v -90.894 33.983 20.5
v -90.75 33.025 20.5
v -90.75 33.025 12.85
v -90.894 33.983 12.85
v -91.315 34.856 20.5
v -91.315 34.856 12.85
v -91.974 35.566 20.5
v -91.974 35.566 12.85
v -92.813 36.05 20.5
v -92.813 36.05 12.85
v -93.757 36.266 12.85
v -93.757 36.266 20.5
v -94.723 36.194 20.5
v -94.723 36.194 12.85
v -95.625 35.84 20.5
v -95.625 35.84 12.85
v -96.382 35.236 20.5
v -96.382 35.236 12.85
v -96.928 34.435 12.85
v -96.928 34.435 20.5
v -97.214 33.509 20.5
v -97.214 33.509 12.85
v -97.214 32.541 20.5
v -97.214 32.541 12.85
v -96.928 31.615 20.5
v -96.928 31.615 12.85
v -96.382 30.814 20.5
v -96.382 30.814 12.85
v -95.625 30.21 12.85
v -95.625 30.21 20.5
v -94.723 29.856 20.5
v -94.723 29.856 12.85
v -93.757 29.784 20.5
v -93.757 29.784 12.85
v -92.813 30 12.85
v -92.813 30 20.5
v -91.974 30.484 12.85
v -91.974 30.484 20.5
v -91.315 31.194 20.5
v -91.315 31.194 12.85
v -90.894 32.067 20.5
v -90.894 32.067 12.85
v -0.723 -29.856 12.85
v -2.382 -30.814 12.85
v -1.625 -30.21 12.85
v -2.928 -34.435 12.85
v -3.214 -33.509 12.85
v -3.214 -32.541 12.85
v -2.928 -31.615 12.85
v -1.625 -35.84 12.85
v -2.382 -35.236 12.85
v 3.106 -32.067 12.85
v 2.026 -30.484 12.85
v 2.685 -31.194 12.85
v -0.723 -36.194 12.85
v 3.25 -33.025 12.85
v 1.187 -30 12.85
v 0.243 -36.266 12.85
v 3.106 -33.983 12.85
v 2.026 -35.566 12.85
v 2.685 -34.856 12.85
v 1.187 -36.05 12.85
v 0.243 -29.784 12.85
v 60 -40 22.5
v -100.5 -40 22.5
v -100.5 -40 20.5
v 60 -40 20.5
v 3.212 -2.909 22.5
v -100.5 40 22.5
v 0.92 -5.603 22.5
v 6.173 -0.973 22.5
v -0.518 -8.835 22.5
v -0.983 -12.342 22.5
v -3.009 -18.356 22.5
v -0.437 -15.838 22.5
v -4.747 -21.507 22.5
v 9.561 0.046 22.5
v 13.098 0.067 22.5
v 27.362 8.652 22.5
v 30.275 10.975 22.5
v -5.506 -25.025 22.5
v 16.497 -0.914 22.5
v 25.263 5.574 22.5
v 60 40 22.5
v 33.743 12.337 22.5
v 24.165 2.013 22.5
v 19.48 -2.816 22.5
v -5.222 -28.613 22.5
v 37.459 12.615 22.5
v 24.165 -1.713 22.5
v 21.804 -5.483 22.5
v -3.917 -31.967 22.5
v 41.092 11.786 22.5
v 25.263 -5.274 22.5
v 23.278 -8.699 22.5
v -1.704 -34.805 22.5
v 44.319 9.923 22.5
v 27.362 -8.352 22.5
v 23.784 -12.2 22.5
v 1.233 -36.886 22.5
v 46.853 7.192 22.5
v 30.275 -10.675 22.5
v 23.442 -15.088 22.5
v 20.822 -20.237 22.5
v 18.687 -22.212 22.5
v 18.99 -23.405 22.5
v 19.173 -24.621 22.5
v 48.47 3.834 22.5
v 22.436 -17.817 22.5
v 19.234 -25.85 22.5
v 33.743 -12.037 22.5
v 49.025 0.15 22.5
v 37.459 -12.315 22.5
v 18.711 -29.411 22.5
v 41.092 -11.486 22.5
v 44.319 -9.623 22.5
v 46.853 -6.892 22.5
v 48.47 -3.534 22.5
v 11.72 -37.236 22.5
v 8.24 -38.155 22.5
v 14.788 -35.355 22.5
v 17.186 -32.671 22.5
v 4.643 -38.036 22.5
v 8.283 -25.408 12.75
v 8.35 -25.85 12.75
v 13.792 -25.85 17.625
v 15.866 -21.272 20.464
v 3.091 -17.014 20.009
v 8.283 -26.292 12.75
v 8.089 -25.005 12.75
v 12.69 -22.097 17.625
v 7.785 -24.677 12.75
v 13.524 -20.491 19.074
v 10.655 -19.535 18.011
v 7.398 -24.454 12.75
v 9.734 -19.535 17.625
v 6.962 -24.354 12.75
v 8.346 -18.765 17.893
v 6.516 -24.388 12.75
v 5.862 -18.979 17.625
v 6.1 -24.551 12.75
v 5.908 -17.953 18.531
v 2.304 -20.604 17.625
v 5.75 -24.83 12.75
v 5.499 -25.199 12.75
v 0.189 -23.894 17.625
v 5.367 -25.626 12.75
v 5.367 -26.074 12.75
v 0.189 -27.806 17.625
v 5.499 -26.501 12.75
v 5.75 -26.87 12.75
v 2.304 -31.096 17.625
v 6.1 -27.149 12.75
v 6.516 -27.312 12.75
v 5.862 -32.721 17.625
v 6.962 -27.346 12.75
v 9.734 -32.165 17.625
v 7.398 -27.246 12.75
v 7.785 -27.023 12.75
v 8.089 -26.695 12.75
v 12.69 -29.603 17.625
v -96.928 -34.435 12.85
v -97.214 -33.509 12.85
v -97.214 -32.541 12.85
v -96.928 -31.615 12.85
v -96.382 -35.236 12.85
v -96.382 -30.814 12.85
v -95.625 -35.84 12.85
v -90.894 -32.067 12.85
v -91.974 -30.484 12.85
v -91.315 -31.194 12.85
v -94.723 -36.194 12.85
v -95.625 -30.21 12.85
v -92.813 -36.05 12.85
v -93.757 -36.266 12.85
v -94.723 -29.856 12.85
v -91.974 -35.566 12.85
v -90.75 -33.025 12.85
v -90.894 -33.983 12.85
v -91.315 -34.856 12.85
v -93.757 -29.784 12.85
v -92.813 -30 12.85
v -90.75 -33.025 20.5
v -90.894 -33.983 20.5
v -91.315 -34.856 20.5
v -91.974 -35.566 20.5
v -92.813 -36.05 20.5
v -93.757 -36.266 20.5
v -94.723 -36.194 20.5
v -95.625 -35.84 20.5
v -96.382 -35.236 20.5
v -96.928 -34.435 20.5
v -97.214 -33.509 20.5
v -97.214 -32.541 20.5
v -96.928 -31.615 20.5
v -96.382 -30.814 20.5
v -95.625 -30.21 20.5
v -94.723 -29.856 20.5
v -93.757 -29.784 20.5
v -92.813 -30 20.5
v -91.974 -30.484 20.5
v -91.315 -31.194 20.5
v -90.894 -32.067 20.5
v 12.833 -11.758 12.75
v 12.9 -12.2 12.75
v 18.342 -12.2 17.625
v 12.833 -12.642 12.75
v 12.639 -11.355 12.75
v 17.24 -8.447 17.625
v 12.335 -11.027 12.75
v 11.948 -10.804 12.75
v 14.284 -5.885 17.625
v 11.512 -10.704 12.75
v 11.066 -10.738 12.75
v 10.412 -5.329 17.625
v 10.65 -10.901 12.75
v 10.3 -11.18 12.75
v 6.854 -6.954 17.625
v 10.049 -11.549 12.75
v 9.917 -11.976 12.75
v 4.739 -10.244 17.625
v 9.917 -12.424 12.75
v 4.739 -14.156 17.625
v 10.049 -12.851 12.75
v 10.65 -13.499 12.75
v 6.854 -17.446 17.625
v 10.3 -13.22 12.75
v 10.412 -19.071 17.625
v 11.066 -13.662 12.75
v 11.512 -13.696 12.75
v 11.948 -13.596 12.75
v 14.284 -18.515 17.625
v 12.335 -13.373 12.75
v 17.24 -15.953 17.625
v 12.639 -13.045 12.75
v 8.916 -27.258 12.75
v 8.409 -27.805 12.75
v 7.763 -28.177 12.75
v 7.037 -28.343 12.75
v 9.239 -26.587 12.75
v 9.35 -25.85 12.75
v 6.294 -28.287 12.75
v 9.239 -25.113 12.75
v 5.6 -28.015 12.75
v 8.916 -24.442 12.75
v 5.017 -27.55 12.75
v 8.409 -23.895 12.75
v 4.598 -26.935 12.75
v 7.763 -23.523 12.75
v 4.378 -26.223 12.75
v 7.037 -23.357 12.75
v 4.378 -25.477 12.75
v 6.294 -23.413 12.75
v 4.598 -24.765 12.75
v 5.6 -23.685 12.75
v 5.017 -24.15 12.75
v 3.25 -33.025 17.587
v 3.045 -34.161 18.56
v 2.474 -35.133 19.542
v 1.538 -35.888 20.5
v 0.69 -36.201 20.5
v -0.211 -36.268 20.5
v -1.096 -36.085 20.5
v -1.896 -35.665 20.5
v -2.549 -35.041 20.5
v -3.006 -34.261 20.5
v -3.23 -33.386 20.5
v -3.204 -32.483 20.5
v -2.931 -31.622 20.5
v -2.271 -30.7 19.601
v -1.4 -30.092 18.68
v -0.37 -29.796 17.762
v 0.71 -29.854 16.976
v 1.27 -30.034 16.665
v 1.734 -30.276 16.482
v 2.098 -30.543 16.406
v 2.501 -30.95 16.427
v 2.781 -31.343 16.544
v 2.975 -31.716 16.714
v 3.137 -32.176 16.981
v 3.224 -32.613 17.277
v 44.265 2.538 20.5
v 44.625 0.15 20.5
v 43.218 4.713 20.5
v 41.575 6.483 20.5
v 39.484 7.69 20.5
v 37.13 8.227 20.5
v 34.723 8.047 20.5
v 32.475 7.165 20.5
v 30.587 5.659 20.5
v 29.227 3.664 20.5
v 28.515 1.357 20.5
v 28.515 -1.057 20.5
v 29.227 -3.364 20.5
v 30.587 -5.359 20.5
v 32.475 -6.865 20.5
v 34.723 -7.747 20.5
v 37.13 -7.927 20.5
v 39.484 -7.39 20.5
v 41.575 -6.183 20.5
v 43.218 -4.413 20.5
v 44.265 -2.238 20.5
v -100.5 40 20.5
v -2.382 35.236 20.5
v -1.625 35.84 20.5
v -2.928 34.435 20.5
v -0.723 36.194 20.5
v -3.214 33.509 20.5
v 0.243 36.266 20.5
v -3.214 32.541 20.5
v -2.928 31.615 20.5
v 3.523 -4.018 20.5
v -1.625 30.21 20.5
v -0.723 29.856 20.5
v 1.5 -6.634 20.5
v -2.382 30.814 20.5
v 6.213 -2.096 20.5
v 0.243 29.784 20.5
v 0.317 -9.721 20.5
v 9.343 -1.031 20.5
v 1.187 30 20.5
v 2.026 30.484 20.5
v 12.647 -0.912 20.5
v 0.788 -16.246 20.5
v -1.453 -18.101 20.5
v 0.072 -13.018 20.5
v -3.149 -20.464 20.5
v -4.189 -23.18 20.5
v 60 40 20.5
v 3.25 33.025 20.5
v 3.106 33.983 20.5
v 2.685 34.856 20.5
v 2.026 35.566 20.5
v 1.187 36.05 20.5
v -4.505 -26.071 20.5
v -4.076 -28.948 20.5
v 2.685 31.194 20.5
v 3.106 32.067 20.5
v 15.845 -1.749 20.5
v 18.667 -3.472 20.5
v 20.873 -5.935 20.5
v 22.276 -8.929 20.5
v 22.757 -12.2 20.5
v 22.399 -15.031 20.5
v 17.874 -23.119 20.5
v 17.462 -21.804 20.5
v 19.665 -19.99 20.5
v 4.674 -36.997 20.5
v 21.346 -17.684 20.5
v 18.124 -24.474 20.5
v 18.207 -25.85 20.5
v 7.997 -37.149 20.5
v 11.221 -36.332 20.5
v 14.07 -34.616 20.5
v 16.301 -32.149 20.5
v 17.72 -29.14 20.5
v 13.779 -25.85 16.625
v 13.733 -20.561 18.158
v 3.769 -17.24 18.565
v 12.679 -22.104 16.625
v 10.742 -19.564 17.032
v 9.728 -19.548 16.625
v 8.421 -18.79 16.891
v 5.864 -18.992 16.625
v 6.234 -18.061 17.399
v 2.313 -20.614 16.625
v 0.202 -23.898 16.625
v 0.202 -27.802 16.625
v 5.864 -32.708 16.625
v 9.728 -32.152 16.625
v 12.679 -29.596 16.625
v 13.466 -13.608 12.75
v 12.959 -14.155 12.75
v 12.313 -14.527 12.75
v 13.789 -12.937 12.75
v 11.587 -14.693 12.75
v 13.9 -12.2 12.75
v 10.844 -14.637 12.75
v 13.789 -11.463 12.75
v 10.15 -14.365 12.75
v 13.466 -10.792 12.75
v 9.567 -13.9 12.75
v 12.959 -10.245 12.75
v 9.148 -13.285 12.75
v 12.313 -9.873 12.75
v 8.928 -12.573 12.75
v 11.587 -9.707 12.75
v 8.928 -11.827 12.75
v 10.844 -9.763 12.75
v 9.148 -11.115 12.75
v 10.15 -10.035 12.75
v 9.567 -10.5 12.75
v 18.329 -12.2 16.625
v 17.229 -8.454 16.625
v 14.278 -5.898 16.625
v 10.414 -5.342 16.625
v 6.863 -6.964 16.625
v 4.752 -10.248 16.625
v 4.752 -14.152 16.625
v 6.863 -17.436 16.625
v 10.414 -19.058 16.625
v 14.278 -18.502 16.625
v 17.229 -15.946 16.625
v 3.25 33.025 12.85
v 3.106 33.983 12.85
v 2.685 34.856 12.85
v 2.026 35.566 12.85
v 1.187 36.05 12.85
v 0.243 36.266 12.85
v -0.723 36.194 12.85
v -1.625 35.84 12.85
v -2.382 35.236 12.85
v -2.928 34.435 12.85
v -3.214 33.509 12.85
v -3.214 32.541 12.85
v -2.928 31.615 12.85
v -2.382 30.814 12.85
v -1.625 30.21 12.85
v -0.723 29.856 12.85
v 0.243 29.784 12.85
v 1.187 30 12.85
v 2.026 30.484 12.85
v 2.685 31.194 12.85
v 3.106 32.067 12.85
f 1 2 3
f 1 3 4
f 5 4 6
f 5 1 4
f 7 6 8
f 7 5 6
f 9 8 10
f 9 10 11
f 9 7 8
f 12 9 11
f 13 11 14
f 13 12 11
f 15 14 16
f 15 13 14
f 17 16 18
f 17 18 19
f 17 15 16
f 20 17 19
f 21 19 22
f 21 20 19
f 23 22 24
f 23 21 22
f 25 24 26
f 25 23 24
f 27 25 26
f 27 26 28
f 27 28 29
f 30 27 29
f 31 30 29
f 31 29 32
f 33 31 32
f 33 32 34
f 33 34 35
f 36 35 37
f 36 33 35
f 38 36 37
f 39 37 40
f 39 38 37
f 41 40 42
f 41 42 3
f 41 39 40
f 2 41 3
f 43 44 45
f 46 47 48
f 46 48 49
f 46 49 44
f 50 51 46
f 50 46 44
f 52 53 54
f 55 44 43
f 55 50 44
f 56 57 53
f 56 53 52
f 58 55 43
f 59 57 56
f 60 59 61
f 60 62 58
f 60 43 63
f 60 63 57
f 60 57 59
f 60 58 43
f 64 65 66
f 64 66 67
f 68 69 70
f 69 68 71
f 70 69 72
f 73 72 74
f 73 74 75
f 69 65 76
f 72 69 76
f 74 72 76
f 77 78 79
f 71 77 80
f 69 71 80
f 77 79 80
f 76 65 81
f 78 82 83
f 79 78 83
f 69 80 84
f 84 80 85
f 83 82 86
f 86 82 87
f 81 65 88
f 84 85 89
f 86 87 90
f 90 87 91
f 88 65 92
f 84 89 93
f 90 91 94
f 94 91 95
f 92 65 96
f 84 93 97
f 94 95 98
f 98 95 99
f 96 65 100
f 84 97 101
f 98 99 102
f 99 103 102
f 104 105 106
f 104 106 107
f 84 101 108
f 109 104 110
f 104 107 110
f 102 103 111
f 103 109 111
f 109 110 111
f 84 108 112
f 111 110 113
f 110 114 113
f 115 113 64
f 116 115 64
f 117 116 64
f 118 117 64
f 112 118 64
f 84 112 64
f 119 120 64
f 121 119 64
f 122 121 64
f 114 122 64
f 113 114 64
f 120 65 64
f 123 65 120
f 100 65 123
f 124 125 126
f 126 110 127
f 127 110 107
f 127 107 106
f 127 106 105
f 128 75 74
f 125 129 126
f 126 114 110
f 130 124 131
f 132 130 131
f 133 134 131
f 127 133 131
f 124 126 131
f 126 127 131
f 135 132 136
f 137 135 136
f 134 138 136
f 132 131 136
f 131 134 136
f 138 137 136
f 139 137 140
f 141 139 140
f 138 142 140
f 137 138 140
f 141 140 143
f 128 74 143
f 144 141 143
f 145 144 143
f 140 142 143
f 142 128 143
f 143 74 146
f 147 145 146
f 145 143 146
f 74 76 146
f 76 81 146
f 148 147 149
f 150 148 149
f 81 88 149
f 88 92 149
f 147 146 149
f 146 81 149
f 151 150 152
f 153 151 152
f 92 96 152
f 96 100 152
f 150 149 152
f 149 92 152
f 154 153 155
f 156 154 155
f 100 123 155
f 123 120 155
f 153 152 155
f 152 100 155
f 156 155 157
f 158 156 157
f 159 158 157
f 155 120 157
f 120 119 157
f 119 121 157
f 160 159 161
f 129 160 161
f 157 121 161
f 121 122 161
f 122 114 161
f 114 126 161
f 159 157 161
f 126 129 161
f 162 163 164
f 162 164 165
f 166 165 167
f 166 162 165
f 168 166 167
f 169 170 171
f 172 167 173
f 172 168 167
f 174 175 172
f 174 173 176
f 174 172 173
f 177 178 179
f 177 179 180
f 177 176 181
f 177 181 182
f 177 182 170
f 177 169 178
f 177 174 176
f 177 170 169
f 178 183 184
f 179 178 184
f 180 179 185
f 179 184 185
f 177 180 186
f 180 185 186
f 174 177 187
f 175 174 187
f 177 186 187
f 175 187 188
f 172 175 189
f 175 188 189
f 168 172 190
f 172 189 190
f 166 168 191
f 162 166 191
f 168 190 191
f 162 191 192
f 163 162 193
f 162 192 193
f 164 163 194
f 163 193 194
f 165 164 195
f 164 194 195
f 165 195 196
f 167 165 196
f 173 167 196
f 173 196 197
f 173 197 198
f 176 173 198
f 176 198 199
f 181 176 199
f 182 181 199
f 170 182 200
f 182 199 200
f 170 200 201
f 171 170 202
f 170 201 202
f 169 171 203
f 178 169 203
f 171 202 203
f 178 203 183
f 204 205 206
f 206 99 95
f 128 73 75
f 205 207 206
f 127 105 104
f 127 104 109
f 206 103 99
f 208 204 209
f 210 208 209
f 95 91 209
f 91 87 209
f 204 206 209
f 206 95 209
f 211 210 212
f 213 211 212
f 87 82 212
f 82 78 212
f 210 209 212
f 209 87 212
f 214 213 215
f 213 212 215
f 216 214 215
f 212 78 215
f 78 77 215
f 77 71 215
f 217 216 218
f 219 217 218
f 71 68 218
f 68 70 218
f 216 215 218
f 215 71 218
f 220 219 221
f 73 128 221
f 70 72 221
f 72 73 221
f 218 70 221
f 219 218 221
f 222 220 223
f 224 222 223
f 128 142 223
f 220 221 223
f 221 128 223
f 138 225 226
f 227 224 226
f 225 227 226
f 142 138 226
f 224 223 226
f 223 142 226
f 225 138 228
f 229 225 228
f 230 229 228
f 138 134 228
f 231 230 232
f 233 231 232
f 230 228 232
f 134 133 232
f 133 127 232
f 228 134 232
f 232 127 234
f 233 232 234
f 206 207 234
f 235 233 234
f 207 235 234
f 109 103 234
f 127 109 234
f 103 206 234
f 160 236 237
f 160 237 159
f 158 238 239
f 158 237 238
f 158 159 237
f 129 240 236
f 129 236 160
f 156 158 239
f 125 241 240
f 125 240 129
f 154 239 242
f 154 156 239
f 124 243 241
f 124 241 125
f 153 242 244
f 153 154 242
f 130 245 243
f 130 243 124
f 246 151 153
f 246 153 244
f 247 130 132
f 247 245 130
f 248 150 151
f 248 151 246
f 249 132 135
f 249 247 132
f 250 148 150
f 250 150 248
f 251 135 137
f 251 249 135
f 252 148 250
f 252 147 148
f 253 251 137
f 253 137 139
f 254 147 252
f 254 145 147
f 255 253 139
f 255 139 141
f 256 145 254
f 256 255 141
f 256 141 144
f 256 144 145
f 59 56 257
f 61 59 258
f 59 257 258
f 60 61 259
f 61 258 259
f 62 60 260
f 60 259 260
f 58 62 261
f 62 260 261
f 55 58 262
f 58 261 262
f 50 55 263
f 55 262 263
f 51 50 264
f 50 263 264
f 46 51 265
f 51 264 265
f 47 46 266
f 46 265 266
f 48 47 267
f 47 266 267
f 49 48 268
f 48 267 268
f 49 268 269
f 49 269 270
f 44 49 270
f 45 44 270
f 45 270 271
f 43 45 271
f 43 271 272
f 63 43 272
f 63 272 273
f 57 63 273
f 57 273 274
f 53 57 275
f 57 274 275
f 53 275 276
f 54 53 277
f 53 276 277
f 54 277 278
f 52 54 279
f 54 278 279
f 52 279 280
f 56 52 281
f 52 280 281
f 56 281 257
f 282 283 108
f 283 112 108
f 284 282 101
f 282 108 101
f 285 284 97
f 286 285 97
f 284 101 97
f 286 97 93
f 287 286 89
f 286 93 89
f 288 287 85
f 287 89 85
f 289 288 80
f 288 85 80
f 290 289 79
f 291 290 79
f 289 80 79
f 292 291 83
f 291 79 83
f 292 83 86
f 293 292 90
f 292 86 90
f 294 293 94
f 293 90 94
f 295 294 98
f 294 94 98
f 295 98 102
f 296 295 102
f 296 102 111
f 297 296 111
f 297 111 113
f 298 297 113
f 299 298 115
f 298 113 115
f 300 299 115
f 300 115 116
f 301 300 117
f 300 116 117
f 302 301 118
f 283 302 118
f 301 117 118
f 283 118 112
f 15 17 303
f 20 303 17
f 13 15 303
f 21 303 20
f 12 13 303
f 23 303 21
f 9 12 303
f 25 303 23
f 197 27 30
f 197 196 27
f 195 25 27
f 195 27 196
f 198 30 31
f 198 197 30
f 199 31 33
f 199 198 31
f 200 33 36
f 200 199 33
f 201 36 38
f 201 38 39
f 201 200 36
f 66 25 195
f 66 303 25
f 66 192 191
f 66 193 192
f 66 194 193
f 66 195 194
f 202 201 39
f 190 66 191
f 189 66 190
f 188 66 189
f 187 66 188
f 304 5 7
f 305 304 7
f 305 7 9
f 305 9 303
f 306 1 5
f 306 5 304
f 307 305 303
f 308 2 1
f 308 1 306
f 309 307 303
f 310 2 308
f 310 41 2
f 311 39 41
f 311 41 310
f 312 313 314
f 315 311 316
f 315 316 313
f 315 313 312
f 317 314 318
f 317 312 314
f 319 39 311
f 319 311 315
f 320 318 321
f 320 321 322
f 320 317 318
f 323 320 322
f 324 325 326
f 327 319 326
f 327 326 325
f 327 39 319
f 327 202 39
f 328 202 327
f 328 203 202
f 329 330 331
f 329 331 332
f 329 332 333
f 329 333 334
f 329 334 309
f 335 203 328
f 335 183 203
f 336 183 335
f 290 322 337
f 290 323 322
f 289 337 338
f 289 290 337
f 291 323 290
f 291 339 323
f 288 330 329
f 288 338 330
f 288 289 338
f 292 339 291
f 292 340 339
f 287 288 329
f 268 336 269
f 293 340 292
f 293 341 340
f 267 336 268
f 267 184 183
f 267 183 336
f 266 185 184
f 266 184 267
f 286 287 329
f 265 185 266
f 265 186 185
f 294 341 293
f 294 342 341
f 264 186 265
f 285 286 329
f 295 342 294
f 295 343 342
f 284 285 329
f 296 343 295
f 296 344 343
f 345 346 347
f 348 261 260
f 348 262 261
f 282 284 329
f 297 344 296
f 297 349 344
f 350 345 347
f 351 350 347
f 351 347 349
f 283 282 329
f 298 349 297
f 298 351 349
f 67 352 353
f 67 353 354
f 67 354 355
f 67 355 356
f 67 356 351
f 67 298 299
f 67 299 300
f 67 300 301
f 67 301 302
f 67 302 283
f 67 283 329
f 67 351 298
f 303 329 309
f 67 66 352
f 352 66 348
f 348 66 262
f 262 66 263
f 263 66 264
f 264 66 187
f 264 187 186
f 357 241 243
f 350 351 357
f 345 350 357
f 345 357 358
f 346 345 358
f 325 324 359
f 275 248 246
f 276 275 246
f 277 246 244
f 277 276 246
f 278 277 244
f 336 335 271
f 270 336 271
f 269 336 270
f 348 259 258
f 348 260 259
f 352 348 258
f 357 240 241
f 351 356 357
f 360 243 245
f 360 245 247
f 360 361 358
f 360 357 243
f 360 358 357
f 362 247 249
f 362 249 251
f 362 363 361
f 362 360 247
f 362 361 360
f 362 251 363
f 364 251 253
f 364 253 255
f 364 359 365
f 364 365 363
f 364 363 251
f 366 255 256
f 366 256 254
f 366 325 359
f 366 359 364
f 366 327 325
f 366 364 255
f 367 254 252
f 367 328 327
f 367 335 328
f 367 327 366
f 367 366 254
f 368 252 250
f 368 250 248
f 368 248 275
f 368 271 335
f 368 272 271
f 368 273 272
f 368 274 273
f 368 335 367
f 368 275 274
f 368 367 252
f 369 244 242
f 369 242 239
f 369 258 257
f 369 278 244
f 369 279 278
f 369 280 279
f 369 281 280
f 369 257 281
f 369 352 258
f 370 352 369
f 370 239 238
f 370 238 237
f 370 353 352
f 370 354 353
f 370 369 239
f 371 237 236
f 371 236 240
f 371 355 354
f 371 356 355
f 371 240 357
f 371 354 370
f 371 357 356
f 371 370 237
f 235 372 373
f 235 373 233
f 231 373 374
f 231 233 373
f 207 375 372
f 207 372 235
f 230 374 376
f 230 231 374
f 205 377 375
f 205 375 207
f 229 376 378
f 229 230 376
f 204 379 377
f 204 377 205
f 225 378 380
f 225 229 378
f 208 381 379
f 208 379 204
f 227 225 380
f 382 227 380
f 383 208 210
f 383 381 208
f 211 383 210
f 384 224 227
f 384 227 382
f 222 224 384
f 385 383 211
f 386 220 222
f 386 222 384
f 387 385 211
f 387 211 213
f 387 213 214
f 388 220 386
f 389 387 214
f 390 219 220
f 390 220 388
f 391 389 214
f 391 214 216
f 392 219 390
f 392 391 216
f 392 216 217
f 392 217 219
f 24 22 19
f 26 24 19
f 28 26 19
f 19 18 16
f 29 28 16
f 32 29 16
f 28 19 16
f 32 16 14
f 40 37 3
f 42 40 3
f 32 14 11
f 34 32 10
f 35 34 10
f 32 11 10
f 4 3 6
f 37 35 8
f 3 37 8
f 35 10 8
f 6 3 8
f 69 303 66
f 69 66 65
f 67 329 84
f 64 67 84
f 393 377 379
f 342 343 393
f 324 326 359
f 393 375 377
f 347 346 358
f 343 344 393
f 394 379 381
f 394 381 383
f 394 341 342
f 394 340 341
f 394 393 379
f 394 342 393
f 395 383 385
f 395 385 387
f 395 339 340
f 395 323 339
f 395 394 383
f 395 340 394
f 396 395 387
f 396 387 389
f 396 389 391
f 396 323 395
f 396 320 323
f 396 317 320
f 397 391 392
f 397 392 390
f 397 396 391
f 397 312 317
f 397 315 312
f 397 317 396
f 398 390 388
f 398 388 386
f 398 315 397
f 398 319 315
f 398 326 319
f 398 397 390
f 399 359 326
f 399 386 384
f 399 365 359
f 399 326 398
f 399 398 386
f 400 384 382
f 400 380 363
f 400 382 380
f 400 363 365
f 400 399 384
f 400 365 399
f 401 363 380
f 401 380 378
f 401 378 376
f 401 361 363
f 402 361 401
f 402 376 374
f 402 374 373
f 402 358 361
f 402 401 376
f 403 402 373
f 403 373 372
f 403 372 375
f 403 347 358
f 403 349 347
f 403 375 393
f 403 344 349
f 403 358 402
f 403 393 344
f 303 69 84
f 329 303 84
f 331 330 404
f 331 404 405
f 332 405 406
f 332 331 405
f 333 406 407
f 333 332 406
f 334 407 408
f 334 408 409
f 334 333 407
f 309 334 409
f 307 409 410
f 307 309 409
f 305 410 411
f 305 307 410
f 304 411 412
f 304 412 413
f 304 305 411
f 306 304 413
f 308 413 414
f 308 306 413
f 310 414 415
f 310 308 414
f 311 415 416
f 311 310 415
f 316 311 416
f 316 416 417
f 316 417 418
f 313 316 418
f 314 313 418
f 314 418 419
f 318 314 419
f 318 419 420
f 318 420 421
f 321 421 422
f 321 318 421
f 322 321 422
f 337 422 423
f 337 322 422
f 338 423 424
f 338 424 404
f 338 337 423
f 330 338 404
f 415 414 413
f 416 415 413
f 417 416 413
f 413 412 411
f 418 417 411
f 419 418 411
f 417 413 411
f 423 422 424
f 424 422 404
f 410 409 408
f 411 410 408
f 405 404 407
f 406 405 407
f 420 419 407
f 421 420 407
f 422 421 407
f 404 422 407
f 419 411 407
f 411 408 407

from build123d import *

# Parameters (mm, degrees)
SKETCH001_W                    = 160.5
SKETCH001_H                    = 2
PAD001_DEPTH                   = 40
CYLINDER_R                     = 3.25
CYLINDER_DEPTH                 = 7.65
CYLINDER_LINEARPATTERN_2_R     = 3.25
CYLINDER_LINEARPATTERN_2_DEPTH = 7.65


with BuildPart() as part:
    # Sketch001 → Pad001 (new body, symmetric)
    with BuildSketch(Plane.XZ):
        with Locations((-20.25, 21.5)):
            Rectangle(SKETCH001_W, SKETCH001_H)
    extrude(amount=PAD001_DEPTH, both=True)

    # Cone002 → Cone002 (revolve)
    with BuildSketch(Plane(origin=(11.4, -12.2, 12.75), x_dir=(1, 0, 0), z_dir=(0, -1, 0))):
        Polygon((0, 0), (2.5, 0), (12.5, 8.75), (0, 8.75), align=None)
    revolve(axis=Axis((11.4, -12.2, 12.75), (0, 0, 1)))

    # Cone003 → Cone003 (revolve)
    with BuildSketch(Plane(origin=(6.85, -25.85, 12.75), x_dir=(1, 0, 0), z_dir=(0, -1, 0))):
        Polygon((0, 0), (2.5, 0), (12.5, 8.75), (0, 8.75), align=None)
    revolve(axis=Axis((6.85, -25.85, 12.75), (0, 0, 1)))

    # Cylinder → Cylinder (join)
    with BuildSketch(Plane(origin=(0, -33.025, 20.5), x_dir=(1, 0, 0), z_dir=(0, 0, -1))):
        Circle(CYLINDER_R)
    cylinder = extrude(amount=CYLINDER_DEPTH)

    # Cylinder LinearPattern 2 → Cylinder LinearPattern 2 (add)
    with BuildSketch(Plane(origin=(-94, -33.025, 20.5), x_dir=(1, 0, 0), z_dir=(0, 0, -1))):
        Circle(CYLINDER_LINEARPATTERN_2_R)
    cylinder_linearpattern_2 = extrude(amount=CYLINDER_LINEARPATTERN_2_DEPTH)

    # Mirrored: Cylinder, Cylinder LinearPattern 2 across XZ
    add(cylinder.mirror(Plane.XZ))
    add(cylinder_linearpattern_2.mirror(Plane.XZ))

    # Cone001 → Cone001 (revolve, cut)
    with BuildSketch(Plane(origin=(11.4, -12.2, 12.75), x_dir=(1, 0, 0), z_dir=(0, -1, 0))):
        Polygon((0, 0), (1.5, 0), (13.5, 10.75), (0, 10.75), align=None)
    revolve(axis=Axis((11.4, -12.2, 12.75), (0, 0, 1)), mode=Mode.SUBTRACT)

    # Cone004 → Cone004 (revolve, cut)
    with BuildSketch(Plane(origin=(6.85, -25.85, 12.75), x_dir=(1, 0, 0), z_dir=(0, -1, 0))):
        Polygon((0, 0), (1.5, 0), (13.5, 10.75), (0, 10.75), align=None)
    revolve(axis=Axis((6.85, -25.85, 12.75), (0, 0, 1)), mode=Mode.SUBTRACT)

    # Cone → Cone (revolve, cut)
    with BuildSketch(Plane(origin=(36.525, 0.15, 17.5), x_dir=(1, 0, 0), z_dir=(0, -1, 0))):
        Polygon((0, 0), (1.5, 0), (12.5, 5), (0, 5), align=None)
    revolve(axis=Axis((36.525, 0.15, 17.5), (0, 0, 1)), mode=Mode.SUBTRACT)


solid = part.part
